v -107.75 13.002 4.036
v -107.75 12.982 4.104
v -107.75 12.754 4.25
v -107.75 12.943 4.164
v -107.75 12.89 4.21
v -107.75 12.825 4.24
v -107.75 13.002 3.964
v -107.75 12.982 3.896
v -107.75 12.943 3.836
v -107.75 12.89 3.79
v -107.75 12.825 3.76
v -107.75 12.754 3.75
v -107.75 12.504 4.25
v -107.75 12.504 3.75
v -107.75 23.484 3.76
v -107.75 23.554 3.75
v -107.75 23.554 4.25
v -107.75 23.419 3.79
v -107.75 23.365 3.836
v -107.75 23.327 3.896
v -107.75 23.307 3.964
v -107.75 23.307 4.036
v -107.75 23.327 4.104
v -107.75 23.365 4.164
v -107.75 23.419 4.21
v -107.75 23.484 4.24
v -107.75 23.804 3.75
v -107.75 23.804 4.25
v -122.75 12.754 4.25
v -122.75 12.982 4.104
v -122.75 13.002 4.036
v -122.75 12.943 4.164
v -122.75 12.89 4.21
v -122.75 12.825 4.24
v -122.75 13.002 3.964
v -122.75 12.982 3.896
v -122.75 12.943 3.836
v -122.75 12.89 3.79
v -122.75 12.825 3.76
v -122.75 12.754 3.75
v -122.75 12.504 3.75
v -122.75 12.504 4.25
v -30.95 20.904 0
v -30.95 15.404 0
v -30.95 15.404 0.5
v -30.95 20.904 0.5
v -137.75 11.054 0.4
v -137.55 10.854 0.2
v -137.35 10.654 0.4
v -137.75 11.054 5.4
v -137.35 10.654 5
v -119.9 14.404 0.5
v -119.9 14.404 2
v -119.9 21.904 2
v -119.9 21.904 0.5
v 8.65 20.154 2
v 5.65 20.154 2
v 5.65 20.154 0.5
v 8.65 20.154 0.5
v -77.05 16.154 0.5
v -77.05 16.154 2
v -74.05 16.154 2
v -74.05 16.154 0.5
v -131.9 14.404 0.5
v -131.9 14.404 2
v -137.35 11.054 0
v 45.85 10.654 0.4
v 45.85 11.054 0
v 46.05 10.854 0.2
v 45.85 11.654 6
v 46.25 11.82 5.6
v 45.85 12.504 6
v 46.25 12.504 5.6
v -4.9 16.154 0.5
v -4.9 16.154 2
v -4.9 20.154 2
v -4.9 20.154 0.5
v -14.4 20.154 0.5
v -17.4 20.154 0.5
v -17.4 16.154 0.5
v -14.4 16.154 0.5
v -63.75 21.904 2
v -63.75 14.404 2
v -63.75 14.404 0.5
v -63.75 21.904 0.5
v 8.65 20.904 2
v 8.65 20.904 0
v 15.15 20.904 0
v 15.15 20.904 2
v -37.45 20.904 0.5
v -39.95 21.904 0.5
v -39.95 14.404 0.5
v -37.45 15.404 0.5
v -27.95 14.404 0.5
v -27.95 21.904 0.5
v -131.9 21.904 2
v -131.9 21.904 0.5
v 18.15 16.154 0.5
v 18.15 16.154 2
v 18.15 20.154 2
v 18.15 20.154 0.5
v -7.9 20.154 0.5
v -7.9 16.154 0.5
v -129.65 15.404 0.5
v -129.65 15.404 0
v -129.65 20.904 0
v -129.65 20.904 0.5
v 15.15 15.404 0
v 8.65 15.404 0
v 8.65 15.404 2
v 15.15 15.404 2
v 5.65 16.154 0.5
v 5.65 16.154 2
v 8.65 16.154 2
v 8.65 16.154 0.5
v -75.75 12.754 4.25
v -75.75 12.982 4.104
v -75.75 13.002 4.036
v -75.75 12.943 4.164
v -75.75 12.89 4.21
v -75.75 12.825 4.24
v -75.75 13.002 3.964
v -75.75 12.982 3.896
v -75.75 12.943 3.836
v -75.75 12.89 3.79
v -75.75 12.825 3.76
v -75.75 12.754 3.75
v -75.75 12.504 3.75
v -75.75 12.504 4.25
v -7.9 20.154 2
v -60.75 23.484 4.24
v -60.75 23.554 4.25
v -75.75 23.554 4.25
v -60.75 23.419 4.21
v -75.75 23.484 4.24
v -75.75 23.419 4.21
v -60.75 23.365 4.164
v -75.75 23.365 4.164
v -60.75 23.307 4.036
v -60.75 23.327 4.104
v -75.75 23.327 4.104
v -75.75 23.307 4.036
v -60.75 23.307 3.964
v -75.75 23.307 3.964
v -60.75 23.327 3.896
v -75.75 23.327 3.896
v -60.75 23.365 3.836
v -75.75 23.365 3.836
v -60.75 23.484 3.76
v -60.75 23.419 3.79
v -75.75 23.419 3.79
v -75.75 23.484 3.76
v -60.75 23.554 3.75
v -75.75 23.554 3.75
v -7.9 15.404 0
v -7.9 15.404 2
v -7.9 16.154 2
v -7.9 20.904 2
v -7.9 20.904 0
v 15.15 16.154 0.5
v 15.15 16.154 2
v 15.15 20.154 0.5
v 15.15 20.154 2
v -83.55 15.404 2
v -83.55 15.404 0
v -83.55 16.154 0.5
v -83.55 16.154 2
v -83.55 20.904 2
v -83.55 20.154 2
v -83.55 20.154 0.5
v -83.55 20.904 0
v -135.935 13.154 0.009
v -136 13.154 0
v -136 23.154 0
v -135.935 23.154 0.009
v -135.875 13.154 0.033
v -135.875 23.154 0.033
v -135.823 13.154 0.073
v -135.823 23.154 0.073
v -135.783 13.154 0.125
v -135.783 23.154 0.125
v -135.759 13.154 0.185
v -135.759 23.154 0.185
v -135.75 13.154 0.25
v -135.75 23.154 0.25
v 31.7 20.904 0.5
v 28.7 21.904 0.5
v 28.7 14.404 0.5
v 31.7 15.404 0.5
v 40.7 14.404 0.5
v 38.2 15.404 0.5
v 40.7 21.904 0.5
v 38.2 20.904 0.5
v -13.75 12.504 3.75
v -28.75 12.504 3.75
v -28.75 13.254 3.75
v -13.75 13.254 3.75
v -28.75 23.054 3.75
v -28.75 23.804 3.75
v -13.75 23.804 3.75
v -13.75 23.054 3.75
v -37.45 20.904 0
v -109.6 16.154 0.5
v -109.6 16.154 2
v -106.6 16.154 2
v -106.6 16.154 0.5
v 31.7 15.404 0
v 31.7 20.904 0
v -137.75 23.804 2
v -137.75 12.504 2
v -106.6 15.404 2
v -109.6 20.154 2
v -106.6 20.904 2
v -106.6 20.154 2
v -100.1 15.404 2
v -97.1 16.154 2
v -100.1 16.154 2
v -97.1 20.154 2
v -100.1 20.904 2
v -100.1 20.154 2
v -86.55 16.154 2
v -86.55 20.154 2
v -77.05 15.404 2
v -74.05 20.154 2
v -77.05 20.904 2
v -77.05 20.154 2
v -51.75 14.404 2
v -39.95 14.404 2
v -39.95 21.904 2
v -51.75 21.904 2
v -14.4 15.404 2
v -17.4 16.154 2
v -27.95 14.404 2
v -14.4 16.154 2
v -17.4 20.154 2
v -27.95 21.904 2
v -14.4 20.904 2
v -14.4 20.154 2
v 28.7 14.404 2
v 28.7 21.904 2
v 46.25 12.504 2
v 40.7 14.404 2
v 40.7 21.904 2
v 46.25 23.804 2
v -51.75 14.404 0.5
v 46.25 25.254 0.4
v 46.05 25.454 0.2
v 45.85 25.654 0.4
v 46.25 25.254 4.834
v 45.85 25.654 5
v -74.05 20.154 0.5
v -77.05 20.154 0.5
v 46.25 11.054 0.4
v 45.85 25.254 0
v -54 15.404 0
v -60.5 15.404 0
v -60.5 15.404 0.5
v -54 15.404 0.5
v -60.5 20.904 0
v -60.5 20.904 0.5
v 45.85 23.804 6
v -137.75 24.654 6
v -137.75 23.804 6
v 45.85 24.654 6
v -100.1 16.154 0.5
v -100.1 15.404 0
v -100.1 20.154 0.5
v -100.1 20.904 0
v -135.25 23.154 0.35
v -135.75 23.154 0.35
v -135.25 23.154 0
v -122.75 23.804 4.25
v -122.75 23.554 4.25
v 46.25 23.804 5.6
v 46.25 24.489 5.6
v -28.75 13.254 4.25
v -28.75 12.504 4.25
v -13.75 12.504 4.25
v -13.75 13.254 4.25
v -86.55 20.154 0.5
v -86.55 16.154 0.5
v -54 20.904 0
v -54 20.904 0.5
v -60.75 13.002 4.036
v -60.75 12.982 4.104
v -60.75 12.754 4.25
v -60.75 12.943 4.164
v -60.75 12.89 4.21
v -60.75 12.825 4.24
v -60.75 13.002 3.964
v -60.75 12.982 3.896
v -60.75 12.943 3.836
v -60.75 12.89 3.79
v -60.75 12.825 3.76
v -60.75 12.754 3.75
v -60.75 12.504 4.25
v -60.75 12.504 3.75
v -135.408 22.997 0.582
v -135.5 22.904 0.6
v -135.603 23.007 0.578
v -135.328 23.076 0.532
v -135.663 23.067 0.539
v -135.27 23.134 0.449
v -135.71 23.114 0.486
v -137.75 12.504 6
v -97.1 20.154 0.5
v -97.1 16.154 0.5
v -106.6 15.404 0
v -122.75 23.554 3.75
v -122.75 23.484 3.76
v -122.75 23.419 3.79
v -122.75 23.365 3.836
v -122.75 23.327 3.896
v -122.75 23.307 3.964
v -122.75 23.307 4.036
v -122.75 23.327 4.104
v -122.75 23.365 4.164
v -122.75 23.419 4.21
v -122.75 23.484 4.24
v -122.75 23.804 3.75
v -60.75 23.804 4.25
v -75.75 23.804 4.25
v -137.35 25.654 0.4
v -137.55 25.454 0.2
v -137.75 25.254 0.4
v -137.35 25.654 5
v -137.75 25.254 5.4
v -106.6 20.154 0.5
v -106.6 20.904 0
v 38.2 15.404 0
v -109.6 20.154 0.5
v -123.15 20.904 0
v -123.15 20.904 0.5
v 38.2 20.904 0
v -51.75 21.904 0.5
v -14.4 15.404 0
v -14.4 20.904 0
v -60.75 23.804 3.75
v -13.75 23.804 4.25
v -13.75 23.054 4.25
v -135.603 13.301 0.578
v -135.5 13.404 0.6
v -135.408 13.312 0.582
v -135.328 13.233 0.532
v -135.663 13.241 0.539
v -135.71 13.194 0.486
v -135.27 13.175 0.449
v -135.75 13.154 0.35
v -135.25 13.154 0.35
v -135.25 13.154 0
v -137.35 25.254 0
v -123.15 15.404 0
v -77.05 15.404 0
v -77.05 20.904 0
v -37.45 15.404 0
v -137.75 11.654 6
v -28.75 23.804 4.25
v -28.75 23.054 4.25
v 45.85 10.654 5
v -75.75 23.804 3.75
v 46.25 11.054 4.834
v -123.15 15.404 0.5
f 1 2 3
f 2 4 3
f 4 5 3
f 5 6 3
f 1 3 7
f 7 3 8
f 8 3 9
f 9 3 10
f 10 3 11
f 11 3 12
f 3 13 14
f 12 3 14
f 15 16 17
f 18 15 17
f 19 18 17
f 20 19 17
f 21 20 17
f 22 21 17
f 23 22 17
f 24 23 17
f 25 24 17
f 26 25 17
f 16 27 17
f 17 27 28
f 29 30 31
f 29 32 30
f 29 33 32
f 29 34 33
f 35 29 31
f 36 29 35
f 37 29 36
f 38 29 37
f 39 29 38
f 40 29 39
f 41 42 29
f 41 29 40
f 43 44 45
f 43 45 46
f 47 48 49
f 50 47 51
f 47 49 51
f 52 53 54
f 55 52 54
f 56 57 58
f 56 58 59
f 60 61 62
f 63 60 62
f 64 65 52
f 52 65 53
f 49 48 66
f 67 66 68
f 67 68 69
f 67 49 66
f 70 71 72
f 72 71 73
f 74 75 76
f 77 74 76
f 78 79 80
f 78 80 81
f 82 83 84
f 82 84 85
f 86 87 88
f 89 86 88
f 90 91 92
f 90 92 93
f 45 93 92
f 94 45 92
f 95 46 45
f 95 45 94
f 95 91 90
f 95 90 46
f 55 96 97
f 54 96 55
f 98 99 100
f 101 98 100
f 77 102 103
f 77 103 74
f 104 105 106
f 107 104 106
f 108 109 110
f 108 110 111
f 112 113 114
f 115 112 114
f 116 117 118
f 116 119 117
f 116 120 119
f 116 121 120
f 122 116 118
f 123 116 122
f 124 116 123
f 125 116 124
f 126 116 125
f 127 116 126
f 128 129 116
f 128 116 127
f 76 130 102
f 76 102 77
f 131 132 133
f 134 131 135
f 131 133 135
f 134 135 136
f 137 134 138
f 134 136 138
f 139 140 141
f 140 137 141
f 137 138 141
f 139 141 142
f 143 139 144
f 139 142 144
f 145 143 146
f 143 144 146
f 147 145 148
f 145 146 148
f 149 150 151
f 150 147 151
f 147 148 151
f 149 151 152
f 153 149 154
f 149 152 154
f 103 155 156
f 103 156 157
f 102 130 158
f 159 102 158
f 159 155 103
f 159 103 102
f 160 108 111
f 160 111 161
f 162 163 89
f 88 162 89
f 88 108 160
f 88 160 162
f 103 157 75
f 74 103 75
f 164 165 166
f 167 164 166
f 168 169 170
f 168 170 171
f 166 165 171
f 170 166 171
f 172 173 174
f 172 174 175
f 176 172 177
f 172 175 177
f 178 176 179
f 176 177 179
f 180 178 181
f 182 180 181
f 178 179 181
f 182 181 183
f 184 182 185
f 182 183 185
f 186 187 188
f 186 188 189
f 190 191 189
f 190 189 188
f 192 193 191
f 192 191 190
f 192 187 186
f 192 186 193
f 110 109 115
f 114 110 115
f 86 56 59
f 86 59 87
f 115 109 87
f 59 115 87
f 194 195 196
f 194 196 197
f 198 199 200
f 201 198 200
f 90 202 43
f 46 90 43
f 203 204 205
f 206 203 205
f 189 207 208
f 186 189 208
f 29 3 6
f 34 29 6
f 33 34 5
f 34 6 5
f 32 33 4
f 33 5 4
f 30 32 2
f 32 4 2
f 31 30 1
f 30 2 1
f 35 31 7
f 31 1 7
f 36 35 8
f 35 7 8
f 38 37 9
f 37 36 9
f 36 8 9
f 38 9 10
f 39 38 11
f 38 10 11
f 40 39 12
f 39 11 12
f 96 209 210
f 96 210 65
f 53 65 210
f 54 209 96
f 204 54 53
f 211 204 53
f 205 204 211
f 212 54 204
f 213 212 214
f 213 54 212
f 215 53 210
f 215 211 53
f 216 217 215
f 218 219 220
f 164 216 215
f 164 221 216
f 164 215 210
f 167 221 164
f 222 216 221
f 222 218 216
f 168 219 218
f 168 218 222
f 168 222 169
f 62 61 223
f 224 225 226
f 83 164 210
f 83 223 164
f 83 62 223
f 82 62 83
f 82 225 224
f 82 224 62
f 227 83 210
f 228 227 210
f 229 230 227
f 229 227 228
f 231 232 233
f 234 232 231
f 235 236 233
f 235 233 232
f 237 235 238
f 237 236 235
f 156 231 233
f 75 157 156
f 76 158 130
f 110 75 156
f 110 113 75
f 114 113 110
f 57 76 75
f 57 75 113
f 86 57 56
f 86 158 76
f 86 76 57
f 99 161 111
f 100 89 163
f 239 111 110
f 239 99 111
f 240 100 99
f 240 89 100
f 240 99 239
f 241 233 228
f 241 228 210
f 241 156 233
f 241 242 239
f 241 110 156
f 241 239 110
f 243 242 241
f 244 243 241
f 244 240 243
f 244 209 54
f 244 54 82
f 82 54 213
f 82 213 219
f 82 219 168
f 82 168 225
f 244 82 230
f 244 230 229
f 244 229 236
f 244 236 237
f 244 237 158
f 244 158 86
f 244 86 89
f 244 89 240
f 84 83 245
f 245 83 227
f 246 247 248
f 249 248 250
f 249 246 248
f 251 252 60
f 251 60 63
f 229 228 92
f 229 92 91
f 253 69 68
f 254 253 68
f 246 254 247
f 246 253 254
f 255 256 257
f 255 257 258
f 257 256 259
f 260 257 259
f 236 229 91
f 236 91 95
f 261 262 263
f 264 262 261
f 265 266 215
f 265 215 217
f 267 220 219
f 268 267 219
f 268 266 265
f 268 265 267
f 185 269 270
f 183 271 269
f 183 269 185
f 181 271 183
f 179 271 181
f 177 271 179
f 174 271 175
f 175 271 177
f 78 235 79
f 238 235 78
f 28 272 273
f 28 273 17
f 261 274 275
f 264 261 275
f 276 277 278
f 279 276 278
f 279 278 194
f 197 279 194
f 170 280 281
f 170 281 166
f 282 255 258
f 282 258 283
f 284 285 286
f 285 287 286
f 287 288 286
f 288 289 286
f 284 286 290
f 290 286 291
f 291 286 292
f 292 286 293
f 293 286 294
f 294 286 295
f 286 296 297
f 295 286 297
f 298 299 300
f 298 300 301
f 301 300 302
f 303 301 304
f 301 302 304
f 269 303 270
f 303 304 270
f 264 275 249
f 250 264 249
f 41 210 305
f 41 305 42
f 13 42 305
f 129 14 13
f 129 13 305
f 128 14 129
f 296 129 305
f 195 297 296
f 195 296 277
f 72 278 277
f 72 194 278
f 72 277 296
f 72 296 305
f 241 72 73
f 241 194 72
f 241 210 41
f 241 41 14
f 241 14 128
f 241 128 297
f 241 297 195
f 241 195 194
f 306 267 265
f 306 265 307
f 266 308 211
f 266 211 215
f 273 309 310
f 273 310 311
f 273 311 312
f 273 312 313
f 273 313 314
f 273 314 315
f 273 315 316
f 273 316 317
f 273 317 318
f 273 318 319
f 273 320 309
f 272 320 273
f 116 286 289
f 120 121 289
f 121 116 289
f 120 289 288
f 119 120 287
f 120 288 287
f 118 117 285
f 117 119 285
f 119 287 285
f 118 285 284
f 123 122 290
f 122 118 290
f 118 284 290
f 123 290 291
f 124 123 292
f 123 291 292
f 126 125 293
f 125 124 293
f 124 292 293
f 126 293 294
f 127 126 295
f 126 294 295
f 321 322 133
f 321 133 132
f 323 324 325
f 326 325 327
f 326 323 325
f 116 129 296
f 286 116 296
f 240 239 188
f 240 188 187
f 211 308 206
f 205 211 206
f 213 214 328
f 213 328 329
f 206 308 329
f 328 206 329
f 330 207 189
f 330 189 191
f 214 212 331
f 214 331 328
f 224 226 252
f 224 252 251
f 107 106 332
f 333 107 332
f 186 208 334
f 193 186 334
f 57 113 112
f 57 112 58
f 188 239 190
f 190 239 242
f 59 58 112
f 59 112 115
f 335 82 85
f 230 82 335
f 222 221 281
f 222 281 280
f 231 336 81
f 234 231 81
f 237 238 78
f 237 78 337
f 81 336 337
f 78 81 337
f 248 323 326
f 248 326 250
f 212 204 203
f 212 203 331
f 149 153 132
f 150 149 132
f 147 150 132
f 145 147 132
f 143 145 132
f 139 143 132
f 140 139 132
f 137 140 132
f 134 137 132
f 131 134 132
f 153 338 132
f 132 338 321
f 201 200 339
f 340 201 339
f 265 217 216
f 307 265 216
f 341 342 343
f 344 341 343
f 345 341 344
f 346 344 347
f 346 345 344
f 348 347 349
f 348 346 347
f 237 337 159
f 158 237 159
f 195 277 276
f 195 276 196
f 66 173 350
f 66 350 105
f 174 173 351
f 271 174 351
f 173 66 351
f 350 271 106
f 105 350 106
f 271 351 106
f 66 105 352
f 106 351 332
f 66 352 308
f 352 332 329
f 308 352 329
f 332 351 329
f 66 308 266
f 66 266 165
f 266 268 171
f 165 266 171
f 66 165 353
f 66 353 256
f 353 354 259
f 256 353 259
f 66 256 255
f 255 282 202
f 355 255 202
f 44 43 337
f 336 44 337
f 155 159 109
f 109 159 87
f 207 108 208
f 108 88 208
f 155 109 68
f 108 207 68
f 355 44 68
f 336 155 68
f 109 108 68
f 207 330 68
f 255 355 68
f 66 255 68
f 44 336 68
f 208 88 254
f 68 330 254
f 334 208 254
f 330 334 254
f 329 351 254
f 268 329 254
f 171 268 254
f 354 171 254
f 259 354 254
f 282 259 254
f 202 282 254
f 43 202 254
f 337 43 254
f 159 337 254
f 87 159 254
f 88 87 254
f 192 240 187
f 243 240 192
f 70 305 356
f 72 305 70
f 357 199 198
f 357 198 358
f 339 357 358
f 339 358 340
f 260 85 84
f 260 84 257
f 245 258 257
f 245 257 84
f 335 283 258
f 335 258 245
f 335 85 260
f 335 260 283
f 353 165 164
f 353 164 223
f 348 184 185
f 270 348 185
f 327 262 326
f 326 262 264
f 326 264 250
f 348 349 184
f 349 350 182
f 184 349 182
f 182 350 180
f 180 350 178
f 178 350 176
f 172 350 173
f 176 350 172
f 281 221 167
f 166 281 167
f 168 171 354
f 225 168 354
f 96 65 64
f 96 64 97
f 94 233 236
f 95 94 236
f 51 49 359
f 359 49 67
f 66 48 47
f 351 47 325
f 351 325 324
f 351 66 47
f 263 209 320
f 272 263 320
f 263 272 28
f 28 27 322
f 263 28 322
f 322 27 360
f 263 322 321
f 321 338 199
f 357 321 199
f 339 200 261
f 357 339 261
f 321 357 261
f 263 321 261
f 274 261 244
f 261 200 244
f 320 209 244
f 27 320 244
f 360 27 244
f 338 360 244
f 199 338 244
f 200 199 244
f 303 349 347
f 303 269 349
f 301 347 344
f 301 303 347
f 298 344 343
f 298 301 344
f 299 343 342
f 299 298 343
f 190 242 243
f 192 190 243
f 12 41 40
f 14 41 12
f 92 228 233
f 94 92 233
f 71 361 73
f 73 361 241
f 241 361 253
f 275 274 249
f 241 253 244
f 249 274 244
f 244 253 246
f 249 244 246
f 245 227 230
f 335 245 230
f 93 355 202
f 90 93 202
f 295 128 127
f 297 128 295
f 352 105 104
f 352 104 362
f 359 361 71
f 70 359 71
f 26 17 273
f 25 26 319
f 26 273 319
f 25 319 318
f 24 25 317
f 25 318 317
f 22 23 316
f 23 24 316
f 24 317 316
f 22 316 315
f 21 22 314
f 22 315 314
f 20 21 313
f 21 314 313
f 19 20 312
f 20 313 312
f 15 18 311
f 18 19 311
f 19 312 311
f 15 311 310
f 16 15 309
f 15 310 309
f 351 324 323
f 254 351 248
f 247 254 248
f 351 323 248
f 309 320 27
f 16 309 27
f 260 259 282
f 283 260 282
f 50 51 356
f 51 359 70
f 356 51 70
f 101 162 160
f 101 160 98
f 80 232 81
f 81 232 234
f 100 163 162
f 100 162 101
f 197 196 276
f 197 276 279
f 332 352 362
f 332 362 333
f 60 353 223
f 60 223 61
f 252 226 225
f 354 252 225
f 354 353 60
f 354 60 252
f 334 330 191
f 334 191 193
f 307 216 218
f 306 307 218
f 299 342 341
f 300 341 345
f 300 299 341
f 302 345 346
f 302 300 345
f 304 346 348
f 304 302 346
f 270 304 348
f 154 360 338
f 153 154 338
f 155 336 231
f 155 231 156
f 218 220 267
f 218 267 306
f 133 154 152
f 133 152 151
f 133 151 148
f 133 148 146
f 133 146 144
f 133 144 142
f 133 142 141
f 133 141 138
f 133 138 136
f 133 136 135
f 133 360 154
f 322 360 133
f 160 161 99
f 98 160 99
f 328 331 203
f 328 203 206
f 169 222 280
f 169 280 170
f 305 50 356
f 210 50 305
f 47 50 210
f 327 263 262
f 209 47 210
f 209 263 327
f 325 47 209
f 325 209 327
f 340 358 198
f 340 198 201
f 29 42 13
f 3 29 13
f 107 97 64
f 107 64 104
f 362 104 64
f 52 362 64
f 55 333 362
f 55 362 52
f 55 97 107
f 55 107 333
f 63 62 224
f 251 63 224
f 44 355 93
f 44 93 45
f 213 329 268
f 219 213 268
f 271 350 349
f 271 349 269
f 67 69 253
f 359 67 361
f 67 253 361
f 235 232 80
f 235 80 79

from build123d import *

# Parameters (mm, degrees)
SKETCH1_W               = 184
SKETCH1_H               = 15
BOSS_EXTRUDE1_DEPTH     = 6
CUT_EXTRUDE1_DEPTH      = 141.246944523
CUT_EXTRUDE1_DEPTH_BACK = 141.246944523
SKETCH2_W               = 6.5
SKETCH2_H               = 5.5
CUT_EXTRUDE2_DEPTH      = 141.246944523
CUT_EXTRUDE2_DEPTH_BACK = 141.246944523
SKETCH3_W               = 6.5
SKETCH3_H               = 5.5
CUT_EXTRUDE3_DEPTH      = 141.246944523
CUT_EXTRUDE3_DEPTH_BACK = 141.246944523
SKETCH4_W               = 6.5
SKETCH4_H               = 5.5
CUT_EXTRUDE4_DEPTH      = 141.246944523
CUT_EXTRUDE4_DEPTH_BACK = 141.246944523
SKETCH5_W               = 6.5
SKETCH5_H               = 5.5
CUT_EXTRUDE5_DEPTH      = 141.246944523
CUT_EXTRUDE5_DEPTH_BACK = 4
SKETCH8_W               = 184
SKETCH8_H               = 11.3
SKETCH9_W               = 12
SKETCH9_H               = 7.5
SKETCH9_W_2             = 12.5
SKETCH9_H_2             = 4
CUT_EXTRUDE6_DEPTH      = 1.5
SKETCH10_W              = 12.5
SKETCH10_H              = 4
CUT_EXTRUDE7_DEPTH      = 1.5
CUT_EXTRUDE8_DEPTH      = 184
SKETCH13_W              = 0.5
SKETCH13_H              = 10
CUT_EXTRUDE9_DEPTH      = 0.6
FILLET1_R               = 0.25
FILLET2_R               = 0.25
SKETCH16_W              = 15
SKETCH16_H              = 0.5
BOSS_EXTRUDE2_DEPTH     = 0.75
FILLET3_R               = 0.5
FILLET4_R               = 0.25
SKETCH17_W              = 15
SKETCH17_H              = 0.5
BOSS_EXTRUDE3_DEPTH     = 0.75
FILLET5_R               = 0.5
FILLET6_R               = 0.25
LPATTERN1_COUNT         = 3
LPATTERN1_PITCH         = 47
LPATTERN2_COUNT         = 3
LPATTERN2_PITCH         = 47
FILLET7_R               = 0.5
FILLET8_R               = 0.25
FILLET9_R               = 0.5
FILLET10_R              = 0.25
CHAMFER1_SIZE           = 0.4
CHAMFER2_SIZE           = 0.4
CHAMFER3_SIZE           = 0.4
CHAMFER5_SIZE           = 0.4


# Some blends are built 0.0001 mm under size
with BuildPart() as part:
    # Sketch1 → Boss-Extrude1 (new body)
    with BuildSketch(Plane.XY):
        with Locations((-45.75, 18.154296875)):
            Rectangle(SKETCH1_W, SKETCH1_H)
    extrude(amount=BOSS_EXTRUDE1_DEPTH)

    # Sketch2 → Cut-Extrude1 (cut, two sides: drawn at the far end of the back side and taken through both)
    with BuildSketch(Plane.XY.offset(6).offset(-CUT_EXTRUDE1_DEPTH_BACK)):
        with Locations((-126.4, 18.154296875)):
            Rectangle(SKETCH2_W, SKETCH2_H)
    extrude(amount=CUT_EXTRUDE1_DEPTH + CUT_EXTRUDE1_DEPTH_BACK, mode=Mode.SUBTRACT)

    # Sketch3 → Cut-Extrude2 (cut, two sides: drawn at the far end of the back side and taken through both)
    with BuildSketch(Plane.XY.offset(6).offset(-CUT_EXTRUDE2_DEPTH_BACK)):
        with Locations((-103.35, 18.154296875)):
            Rectangle(SKETCH3_W, SKETCH3_H)
    extrude(amount=CUT_EXTRUDE2_DEPTH + CUT_EXTRUDE2_DEPTH_BACK, mode=Mode.SUBTRACT)

    # Sketch4 → Cut-Extrude3 (cut, two sides: drawn at the far end of the back side and taken through both)
    with BuildSketch(Plane.XY.offset(6).offset(-CUT_EXTRUDE3_DEPTH_BACK)):
        with Locations((-80.3, 18.154296875)):
            Rectangle(SKETCH4_W, SKETCH4_H)
    extrude(amount=CUT_EXTRUDE3_DEPTH + CUT_EXTRUDE3_DEPTH_BACK, mode=Mode.SUBTRACT)

    # Sketch5 → Cut-Extrude4 (cut, two sides: drawn at the far end of the back side and taken through both)
    with BuildSketch(Plane.XY.offset(6).offset(-CUT_EXTRUDE4_DEPTH_BACK)):
        with Locations((-57.25, 18.154296875)):
            Rectangle(SKETCH5_W, SKETCH5_H)
        with Locations((-34.2, 18.154296875)):
            Rectangle(SKETCH5_W, SKETCH5_H)
        with Locations((-11.15, 18.154296875)):
            Rectangle(SKETCH5_W, SKETCH5_H)
        with Locations((11.9, 18.154296875)):
            Rectangle(SKETCH5_W, SKETCH5_H)
        with Locations((34.95, 18.154296875)):
            Rectangle(SKETCH5_W, SKETCH5_H)
    extrude(amount=CUT_EXTRUDE4_DEPTH + CUT_EXTRUDE4_DEPTH_BACK, mode=Mode.SUBTRACT)

    # Sketch8 → Cut-Extrude5 (cut, two sides: drawn at the far end of the back side and taken through both)
    with BuildSketch(Plane.XY.offset(6).offset(-CUT_EXTRUDE5_DEPTH_BACK)):
        with Locations((-45.75, 18.154296875)):
            Rectangle(SKETCH8_W, SKETCH8_H)
    extrude(amount=CUT_EXTRUDE5_DEPTH + CUT_EXTRUDE5_DEPTH_BACK, mode=Mode.SUBTRACT)

    # Sketch9 → Cut-Extrude6 (cut)
    with BuildSketch(Plane.XY.offset(2)):
        with Locations((-57.75, 18.154296875)):
            Rectangle(SKETCH9_W, SKETCH9_H)
        with Locations((-33.95, 18.154296875)):
            Rectangle(SKETCH9_W, SKETCH9_H)
        with Locations((-125.9, 18.154296875)):
            Rectangle(SKETCH9_W, SKETCH9_H)
        with Locations((-11.15, 18.154296875)):
            Rectangle(SKETCH9_W_2, SKETCH9_H_2)
        with Locations((11.9, 18.154296875)):
            Rectangle(SKETCH9_W_2, SKETCH9_H_2)
        with Locations((34.7, 18.154296875)):
            Rectangle(SKETCH9_W, SKETCH9_H)
    extrude(amount=-CUT_EXTRUDE6_DEPTH, mode=Mode.SUBTRACT)

    # Sketch10 → Cut-Extrude7 (cut)
    with BuildSketch(Plane.XY.offset(2)):
        with Locations((-80.3, 18.154296875)):
            Rectangle(SKETCH10_W, SKETCH10_H)
        with Locations((-103.35, 18.154296875)):
            Rectangle(SKETCH10_W, SKETCH10_H)
    extrude(amount=-CUT_EXTRUDE7_DEPTH, mode=Mode.SUBTRACT)

    # Sketch12 → Cut-Extrude8 (cut)
    with BuildSketch(Plane(origin=(46.25, 0, 0), x_dir=(0, 0, -1), z_dir=(1, 0, 0))):
        Polygon((-6, 25.654296875), (-6, 24.654296875), (-5, 25.654296875), align=None)
        Polygon((-6, 10.654296875), (-5, 10.654296875), (-6, 11.654296875), align=None)
    extrude(amount=-CUT_EXTRUDE8_DEPTH, mode=Mode.SUBTRACT)

    # Sketch13 → Cut-Extrude9 (cut)
    with BuildSketch(Plane(origin=(0, 0, 0), x_dir=(-1, 0, 0), z_dir=(0, 0, -1))):
        with Locations((135.5, 18.154296875)):
            Rectangle(SKETCH13_W, SKETCH13_H)
    extrude(amount=-CUT_EXTRUDE9_DEPTH, mode=Mode.SUBTRACT)

    # Fillet1
    fillet1_edges = [part.edges().sort_by_distance(p)[0] for p in [
        (-135.75, 18.154296875, 0),
    ]]
    fillet(fillet1_edges, radius=FILLET1_R)

    # Fillet2
    fillet2_edges = [part.edges().sort_by_distance(p)[0] for p in [
        (-135.25, 18.154296875, 0.6),
        (-135.5, 23.154296875, 0.6),
        (-135.75, 18.154296875, 0.6),
        (-135.5, 13.154296875, 0.6),
    ]]
    fillet(fillet2_edges, radius=FILLET2_R - 0.0001)  # a hair under: the kernel refuses the full size

    # Sketch16 → Boss-Extrude2 (add)
    with BuildSketch(Plane.XZ.offset(-23.804296875)):
        with Locations((-115.25, 4)):
            Rectangle(SKETCH16_W, SKETCH16_H)
    boss_extrude2 = extrude(amount=BOSS_EXTRUDE2_DEPTH)

    # Fillet3
    fillet3_edges = [part.edges().sort_by_distance(p)[0] for p in [
        (-115.25, 23.054296875, 4.25),
    ]]
    fillet(fillet3_edges, radius=FILLET3_R - 0.0001)  # a hair under: the kernel refuses the full size

    # Fillet4
    # the kernel refuses this fillet: 0.25 mm, written as the material it takes off along each edge
    with BuildSketch(Plane(origin=(-124.517583763, 23.054296875, 3.75), x_dir=(0, 0.7070334884245003, 0.7071800663524687), z_dir=(1, 0, 0))) as fillet4_piece_1:
        with BuildLine():
            CenterArc((0.530239772, -0.176759658), FILLET4_R, 44.994478191, 179.999583317)
            Line((0.353444756, -0.35351803), (0.335765254, -0.371193867))
            Line((0.335765254, -0.371193867), (-0.017679502, -0.017675837))
            Line((-0.017679502, -0.017675837), (-0.017675837, 0.017679502))
            ThreePointArc((-0.017675837, 0.017679502), (-0.017605119, 0.017750205), (0.724712877, 0.017675966))
            Line((0.724712877, 0.017675966), (0.707033504, 0))
        make_face()
    extrude(amount=18.535167526, mode=Mode.SUBTRACT)

    # Sketch17 → Boss-Extrude3 (add)
    with BuildSketch(Plane(origin=(0, 12.504296875, 0), x_dir=(1, 0, 0), z_dir=(0, 1, 0))):
        with Locations((-115.25, -4)):
            Rectangle(SKETCH17_W, SKETCH17_H)
    boss_extrude3 = extrude(amount=BOSS_EXTRUDE3_DEPTH)

    # Fillet5
    fillet5_edges = [part.edges().sort_by_distance(p)[0] for p in [
        (-115.25, 13.254296875, 4.25),
    ]]
    fillet(fillet5_edges, radius=FILLET5_R - 0.0001)  # a hair under: the kernel refuses the full size

    # Fillet6
    # the kernel refuses this fillet: 0.25 mm, written as the material it takes off along each edge
    with BuildSketch(Plane(origin=(-105.982416233, 13.254296875, 3.75), x_dir=(0, -0.7070334900459336, 0.7071800647313715), z_dir=(-1, 0, 0))) as fillet6_piece_1:
        with BuildLine():
            CenterArc((0.530239774, -0.176759657), FILLET6_R, 44.994478059, 179.99958358)
            Line((0.353444758, -0.35351803), (0.335765256, -0.371193867))
            Line((0.335765256, -0.371193867), (-0.017679502, -0.017675837))
            Line((-0.017679502, -0.017675837), (-0.017675837, 0.017679502))
            ThreePointArc((-0.017675837, 0.017679502), (-0.017605119, 0.017750205), (0.724712878, 0.017675966))
            Line((0.724712878, 0.017675966), (0.707033505, 0))
        make_face()
    extrude(amount=18.535167534, mode=Mode.SUBTRACT)

    # LPattern1: Boss-Extrude3 ×3
    with Locations(*[(i * LPATTERN1_PITCH, 0, 0) for i in range(1, LPATTERN1_COUNT)]):
        add(boss_extrude3)

    # LPattern2: Boss-Extrude2 ×3
    with Locations(*[(i * LPATTERN2_PITCH, 0, 0) for i in range(1, LPATTERN2_COUNT)]):
        add(boss_extrude2)

    # Fillet7
    fillet7_edges = [part.edges().sort_by_distance(p)[0] for p in [
        (-68.25, 23.054296875, 4.25),
    ]]
    fillet(fillet7_edges, radius=FILLET7_R - 0.0001)  # a hair under: the kernel refuses the full size

    # Fillet8
    # the kernel refuses this fillet: 0.25 mm, written as the material it takes off along each edge
    with BuildSketch(Plane(origin=(-77.517583763, 23.054296875, 3.75), x_dir=(0, 0.7070334884245003, 0.7071800663524687), z_dir=(1, 0, 0))) as fillet8_piece_1:
        with BuildLine():
            CenterArc((0.530239772, -0.176759658), FILLET8_R, 44.994478191, 179.999583317)
            Line((0.353444756, -0.35351803), (0.335765254, -0.371193867))
            Line((0.335765254, -0.371193867), (-0.017679502, -0.017675837))
            Line((-0.017679502, -0.017675837), (-0.017675837, 0.017679502))
            ThreePointArc((-0.017675837, 0.017679502), (-0.017605119, 0.017750205), (0.724712877, 0.017675966))
            Line((0.724712877, 0.017675966), (0.707033504, 0))
        make_face()
    extrude(amount=18.535167526, mode=Mode.SUBTRACT)

    # Fillet9
    fillet9_edges = [part.edges().sort_by_distance(p)[0] for p in [
        (-68.25, 13.254296875, 4.25),
    ]]
    fillet(fillet9_edges, radius=FILLET9_R - 0.0001)  # a hair under: the kernel refuses the full size

    # Fillet10
    # the kernel refuses this fillet: 0.25 mm, written as the material it takes off along each edge
    with BuildSketch(Plane(origin=(-58.982416233, 13.254296875, 3.75), x_dir=(0, -0.7070334916347167, 0.7071800631429177), z_dir=(-1, 0, 0))) as fillet10_piece_1:
        with BuildLine():
            CenterArc((0.530239775, -0.176759657), FILLET10_R, 44.994477931, 179.999583837)
            Line((0.353444759, -0.35351803), (0.335765258, -0.371193867))
            Line((0.335765258, -0.371193867), (-0.017679502, -0.017675837))
            Line((-0.017679502, -0.017675837), (-0.017675837, 0.017679502))
            ThreePointArc((-0.017675837, 0.017679502), (-0.017605119, 0.017750205), (0.72471288, 0.017675966))
            Line((0.72471288, 0.017675966), (0.707033507, 0))
        make_face()
    extrude(amount=18.535167534, mode=Mode.SUBTRACT)

    # Chamfer1
    chamfer1_edges = [part.edges().sort_by_distance(p)[0] for p in [
        (-45.75, 25.654296875, 0),
        (-45.75, 10.654296875, 0),
    ]]
    chamfer(chamfer1_edges, length=CHAMFER1_SIZE)

    # Chamfer2
    chamfer2_edges = [part.edges().sort_by_distance(p)[0] for p in [
        (46.25, 18.154296875, 0),
        (-137.75, 18.154296875, 0),
    ]]
    chamfer(chamfer2_edges, length=CHAMFER2_SIZE)

    # Chamfer3
    chamfer3_edges = [part.edges().sort_by_distance(p)[0] for p in [
        (-137.75, 25.654296875, 2.7),
        (-137.75, 10.654296875, 2.7),
    ]]
    chamfer(chamfer3_edges, length=CHAMFER3_SIZE)

    # Chamfer5
    chamfer5_edges = [part.edges().sort_by_distance(p)[0] for p in [
        (46.25, 24.229296875, 6),
        (46.25, 25.654296875, 2.7),
        (46.25, 10.654296875, 2.7),
        (46.25, 12.079296875, 6),
        (46.25, 25.154296875, 5.5),
        (46.25, 11.154296875, 5.5),
    ]]
    chamfer(chamfer5_edges, length=CHAMFER5_SIZE)


solid = part.part
